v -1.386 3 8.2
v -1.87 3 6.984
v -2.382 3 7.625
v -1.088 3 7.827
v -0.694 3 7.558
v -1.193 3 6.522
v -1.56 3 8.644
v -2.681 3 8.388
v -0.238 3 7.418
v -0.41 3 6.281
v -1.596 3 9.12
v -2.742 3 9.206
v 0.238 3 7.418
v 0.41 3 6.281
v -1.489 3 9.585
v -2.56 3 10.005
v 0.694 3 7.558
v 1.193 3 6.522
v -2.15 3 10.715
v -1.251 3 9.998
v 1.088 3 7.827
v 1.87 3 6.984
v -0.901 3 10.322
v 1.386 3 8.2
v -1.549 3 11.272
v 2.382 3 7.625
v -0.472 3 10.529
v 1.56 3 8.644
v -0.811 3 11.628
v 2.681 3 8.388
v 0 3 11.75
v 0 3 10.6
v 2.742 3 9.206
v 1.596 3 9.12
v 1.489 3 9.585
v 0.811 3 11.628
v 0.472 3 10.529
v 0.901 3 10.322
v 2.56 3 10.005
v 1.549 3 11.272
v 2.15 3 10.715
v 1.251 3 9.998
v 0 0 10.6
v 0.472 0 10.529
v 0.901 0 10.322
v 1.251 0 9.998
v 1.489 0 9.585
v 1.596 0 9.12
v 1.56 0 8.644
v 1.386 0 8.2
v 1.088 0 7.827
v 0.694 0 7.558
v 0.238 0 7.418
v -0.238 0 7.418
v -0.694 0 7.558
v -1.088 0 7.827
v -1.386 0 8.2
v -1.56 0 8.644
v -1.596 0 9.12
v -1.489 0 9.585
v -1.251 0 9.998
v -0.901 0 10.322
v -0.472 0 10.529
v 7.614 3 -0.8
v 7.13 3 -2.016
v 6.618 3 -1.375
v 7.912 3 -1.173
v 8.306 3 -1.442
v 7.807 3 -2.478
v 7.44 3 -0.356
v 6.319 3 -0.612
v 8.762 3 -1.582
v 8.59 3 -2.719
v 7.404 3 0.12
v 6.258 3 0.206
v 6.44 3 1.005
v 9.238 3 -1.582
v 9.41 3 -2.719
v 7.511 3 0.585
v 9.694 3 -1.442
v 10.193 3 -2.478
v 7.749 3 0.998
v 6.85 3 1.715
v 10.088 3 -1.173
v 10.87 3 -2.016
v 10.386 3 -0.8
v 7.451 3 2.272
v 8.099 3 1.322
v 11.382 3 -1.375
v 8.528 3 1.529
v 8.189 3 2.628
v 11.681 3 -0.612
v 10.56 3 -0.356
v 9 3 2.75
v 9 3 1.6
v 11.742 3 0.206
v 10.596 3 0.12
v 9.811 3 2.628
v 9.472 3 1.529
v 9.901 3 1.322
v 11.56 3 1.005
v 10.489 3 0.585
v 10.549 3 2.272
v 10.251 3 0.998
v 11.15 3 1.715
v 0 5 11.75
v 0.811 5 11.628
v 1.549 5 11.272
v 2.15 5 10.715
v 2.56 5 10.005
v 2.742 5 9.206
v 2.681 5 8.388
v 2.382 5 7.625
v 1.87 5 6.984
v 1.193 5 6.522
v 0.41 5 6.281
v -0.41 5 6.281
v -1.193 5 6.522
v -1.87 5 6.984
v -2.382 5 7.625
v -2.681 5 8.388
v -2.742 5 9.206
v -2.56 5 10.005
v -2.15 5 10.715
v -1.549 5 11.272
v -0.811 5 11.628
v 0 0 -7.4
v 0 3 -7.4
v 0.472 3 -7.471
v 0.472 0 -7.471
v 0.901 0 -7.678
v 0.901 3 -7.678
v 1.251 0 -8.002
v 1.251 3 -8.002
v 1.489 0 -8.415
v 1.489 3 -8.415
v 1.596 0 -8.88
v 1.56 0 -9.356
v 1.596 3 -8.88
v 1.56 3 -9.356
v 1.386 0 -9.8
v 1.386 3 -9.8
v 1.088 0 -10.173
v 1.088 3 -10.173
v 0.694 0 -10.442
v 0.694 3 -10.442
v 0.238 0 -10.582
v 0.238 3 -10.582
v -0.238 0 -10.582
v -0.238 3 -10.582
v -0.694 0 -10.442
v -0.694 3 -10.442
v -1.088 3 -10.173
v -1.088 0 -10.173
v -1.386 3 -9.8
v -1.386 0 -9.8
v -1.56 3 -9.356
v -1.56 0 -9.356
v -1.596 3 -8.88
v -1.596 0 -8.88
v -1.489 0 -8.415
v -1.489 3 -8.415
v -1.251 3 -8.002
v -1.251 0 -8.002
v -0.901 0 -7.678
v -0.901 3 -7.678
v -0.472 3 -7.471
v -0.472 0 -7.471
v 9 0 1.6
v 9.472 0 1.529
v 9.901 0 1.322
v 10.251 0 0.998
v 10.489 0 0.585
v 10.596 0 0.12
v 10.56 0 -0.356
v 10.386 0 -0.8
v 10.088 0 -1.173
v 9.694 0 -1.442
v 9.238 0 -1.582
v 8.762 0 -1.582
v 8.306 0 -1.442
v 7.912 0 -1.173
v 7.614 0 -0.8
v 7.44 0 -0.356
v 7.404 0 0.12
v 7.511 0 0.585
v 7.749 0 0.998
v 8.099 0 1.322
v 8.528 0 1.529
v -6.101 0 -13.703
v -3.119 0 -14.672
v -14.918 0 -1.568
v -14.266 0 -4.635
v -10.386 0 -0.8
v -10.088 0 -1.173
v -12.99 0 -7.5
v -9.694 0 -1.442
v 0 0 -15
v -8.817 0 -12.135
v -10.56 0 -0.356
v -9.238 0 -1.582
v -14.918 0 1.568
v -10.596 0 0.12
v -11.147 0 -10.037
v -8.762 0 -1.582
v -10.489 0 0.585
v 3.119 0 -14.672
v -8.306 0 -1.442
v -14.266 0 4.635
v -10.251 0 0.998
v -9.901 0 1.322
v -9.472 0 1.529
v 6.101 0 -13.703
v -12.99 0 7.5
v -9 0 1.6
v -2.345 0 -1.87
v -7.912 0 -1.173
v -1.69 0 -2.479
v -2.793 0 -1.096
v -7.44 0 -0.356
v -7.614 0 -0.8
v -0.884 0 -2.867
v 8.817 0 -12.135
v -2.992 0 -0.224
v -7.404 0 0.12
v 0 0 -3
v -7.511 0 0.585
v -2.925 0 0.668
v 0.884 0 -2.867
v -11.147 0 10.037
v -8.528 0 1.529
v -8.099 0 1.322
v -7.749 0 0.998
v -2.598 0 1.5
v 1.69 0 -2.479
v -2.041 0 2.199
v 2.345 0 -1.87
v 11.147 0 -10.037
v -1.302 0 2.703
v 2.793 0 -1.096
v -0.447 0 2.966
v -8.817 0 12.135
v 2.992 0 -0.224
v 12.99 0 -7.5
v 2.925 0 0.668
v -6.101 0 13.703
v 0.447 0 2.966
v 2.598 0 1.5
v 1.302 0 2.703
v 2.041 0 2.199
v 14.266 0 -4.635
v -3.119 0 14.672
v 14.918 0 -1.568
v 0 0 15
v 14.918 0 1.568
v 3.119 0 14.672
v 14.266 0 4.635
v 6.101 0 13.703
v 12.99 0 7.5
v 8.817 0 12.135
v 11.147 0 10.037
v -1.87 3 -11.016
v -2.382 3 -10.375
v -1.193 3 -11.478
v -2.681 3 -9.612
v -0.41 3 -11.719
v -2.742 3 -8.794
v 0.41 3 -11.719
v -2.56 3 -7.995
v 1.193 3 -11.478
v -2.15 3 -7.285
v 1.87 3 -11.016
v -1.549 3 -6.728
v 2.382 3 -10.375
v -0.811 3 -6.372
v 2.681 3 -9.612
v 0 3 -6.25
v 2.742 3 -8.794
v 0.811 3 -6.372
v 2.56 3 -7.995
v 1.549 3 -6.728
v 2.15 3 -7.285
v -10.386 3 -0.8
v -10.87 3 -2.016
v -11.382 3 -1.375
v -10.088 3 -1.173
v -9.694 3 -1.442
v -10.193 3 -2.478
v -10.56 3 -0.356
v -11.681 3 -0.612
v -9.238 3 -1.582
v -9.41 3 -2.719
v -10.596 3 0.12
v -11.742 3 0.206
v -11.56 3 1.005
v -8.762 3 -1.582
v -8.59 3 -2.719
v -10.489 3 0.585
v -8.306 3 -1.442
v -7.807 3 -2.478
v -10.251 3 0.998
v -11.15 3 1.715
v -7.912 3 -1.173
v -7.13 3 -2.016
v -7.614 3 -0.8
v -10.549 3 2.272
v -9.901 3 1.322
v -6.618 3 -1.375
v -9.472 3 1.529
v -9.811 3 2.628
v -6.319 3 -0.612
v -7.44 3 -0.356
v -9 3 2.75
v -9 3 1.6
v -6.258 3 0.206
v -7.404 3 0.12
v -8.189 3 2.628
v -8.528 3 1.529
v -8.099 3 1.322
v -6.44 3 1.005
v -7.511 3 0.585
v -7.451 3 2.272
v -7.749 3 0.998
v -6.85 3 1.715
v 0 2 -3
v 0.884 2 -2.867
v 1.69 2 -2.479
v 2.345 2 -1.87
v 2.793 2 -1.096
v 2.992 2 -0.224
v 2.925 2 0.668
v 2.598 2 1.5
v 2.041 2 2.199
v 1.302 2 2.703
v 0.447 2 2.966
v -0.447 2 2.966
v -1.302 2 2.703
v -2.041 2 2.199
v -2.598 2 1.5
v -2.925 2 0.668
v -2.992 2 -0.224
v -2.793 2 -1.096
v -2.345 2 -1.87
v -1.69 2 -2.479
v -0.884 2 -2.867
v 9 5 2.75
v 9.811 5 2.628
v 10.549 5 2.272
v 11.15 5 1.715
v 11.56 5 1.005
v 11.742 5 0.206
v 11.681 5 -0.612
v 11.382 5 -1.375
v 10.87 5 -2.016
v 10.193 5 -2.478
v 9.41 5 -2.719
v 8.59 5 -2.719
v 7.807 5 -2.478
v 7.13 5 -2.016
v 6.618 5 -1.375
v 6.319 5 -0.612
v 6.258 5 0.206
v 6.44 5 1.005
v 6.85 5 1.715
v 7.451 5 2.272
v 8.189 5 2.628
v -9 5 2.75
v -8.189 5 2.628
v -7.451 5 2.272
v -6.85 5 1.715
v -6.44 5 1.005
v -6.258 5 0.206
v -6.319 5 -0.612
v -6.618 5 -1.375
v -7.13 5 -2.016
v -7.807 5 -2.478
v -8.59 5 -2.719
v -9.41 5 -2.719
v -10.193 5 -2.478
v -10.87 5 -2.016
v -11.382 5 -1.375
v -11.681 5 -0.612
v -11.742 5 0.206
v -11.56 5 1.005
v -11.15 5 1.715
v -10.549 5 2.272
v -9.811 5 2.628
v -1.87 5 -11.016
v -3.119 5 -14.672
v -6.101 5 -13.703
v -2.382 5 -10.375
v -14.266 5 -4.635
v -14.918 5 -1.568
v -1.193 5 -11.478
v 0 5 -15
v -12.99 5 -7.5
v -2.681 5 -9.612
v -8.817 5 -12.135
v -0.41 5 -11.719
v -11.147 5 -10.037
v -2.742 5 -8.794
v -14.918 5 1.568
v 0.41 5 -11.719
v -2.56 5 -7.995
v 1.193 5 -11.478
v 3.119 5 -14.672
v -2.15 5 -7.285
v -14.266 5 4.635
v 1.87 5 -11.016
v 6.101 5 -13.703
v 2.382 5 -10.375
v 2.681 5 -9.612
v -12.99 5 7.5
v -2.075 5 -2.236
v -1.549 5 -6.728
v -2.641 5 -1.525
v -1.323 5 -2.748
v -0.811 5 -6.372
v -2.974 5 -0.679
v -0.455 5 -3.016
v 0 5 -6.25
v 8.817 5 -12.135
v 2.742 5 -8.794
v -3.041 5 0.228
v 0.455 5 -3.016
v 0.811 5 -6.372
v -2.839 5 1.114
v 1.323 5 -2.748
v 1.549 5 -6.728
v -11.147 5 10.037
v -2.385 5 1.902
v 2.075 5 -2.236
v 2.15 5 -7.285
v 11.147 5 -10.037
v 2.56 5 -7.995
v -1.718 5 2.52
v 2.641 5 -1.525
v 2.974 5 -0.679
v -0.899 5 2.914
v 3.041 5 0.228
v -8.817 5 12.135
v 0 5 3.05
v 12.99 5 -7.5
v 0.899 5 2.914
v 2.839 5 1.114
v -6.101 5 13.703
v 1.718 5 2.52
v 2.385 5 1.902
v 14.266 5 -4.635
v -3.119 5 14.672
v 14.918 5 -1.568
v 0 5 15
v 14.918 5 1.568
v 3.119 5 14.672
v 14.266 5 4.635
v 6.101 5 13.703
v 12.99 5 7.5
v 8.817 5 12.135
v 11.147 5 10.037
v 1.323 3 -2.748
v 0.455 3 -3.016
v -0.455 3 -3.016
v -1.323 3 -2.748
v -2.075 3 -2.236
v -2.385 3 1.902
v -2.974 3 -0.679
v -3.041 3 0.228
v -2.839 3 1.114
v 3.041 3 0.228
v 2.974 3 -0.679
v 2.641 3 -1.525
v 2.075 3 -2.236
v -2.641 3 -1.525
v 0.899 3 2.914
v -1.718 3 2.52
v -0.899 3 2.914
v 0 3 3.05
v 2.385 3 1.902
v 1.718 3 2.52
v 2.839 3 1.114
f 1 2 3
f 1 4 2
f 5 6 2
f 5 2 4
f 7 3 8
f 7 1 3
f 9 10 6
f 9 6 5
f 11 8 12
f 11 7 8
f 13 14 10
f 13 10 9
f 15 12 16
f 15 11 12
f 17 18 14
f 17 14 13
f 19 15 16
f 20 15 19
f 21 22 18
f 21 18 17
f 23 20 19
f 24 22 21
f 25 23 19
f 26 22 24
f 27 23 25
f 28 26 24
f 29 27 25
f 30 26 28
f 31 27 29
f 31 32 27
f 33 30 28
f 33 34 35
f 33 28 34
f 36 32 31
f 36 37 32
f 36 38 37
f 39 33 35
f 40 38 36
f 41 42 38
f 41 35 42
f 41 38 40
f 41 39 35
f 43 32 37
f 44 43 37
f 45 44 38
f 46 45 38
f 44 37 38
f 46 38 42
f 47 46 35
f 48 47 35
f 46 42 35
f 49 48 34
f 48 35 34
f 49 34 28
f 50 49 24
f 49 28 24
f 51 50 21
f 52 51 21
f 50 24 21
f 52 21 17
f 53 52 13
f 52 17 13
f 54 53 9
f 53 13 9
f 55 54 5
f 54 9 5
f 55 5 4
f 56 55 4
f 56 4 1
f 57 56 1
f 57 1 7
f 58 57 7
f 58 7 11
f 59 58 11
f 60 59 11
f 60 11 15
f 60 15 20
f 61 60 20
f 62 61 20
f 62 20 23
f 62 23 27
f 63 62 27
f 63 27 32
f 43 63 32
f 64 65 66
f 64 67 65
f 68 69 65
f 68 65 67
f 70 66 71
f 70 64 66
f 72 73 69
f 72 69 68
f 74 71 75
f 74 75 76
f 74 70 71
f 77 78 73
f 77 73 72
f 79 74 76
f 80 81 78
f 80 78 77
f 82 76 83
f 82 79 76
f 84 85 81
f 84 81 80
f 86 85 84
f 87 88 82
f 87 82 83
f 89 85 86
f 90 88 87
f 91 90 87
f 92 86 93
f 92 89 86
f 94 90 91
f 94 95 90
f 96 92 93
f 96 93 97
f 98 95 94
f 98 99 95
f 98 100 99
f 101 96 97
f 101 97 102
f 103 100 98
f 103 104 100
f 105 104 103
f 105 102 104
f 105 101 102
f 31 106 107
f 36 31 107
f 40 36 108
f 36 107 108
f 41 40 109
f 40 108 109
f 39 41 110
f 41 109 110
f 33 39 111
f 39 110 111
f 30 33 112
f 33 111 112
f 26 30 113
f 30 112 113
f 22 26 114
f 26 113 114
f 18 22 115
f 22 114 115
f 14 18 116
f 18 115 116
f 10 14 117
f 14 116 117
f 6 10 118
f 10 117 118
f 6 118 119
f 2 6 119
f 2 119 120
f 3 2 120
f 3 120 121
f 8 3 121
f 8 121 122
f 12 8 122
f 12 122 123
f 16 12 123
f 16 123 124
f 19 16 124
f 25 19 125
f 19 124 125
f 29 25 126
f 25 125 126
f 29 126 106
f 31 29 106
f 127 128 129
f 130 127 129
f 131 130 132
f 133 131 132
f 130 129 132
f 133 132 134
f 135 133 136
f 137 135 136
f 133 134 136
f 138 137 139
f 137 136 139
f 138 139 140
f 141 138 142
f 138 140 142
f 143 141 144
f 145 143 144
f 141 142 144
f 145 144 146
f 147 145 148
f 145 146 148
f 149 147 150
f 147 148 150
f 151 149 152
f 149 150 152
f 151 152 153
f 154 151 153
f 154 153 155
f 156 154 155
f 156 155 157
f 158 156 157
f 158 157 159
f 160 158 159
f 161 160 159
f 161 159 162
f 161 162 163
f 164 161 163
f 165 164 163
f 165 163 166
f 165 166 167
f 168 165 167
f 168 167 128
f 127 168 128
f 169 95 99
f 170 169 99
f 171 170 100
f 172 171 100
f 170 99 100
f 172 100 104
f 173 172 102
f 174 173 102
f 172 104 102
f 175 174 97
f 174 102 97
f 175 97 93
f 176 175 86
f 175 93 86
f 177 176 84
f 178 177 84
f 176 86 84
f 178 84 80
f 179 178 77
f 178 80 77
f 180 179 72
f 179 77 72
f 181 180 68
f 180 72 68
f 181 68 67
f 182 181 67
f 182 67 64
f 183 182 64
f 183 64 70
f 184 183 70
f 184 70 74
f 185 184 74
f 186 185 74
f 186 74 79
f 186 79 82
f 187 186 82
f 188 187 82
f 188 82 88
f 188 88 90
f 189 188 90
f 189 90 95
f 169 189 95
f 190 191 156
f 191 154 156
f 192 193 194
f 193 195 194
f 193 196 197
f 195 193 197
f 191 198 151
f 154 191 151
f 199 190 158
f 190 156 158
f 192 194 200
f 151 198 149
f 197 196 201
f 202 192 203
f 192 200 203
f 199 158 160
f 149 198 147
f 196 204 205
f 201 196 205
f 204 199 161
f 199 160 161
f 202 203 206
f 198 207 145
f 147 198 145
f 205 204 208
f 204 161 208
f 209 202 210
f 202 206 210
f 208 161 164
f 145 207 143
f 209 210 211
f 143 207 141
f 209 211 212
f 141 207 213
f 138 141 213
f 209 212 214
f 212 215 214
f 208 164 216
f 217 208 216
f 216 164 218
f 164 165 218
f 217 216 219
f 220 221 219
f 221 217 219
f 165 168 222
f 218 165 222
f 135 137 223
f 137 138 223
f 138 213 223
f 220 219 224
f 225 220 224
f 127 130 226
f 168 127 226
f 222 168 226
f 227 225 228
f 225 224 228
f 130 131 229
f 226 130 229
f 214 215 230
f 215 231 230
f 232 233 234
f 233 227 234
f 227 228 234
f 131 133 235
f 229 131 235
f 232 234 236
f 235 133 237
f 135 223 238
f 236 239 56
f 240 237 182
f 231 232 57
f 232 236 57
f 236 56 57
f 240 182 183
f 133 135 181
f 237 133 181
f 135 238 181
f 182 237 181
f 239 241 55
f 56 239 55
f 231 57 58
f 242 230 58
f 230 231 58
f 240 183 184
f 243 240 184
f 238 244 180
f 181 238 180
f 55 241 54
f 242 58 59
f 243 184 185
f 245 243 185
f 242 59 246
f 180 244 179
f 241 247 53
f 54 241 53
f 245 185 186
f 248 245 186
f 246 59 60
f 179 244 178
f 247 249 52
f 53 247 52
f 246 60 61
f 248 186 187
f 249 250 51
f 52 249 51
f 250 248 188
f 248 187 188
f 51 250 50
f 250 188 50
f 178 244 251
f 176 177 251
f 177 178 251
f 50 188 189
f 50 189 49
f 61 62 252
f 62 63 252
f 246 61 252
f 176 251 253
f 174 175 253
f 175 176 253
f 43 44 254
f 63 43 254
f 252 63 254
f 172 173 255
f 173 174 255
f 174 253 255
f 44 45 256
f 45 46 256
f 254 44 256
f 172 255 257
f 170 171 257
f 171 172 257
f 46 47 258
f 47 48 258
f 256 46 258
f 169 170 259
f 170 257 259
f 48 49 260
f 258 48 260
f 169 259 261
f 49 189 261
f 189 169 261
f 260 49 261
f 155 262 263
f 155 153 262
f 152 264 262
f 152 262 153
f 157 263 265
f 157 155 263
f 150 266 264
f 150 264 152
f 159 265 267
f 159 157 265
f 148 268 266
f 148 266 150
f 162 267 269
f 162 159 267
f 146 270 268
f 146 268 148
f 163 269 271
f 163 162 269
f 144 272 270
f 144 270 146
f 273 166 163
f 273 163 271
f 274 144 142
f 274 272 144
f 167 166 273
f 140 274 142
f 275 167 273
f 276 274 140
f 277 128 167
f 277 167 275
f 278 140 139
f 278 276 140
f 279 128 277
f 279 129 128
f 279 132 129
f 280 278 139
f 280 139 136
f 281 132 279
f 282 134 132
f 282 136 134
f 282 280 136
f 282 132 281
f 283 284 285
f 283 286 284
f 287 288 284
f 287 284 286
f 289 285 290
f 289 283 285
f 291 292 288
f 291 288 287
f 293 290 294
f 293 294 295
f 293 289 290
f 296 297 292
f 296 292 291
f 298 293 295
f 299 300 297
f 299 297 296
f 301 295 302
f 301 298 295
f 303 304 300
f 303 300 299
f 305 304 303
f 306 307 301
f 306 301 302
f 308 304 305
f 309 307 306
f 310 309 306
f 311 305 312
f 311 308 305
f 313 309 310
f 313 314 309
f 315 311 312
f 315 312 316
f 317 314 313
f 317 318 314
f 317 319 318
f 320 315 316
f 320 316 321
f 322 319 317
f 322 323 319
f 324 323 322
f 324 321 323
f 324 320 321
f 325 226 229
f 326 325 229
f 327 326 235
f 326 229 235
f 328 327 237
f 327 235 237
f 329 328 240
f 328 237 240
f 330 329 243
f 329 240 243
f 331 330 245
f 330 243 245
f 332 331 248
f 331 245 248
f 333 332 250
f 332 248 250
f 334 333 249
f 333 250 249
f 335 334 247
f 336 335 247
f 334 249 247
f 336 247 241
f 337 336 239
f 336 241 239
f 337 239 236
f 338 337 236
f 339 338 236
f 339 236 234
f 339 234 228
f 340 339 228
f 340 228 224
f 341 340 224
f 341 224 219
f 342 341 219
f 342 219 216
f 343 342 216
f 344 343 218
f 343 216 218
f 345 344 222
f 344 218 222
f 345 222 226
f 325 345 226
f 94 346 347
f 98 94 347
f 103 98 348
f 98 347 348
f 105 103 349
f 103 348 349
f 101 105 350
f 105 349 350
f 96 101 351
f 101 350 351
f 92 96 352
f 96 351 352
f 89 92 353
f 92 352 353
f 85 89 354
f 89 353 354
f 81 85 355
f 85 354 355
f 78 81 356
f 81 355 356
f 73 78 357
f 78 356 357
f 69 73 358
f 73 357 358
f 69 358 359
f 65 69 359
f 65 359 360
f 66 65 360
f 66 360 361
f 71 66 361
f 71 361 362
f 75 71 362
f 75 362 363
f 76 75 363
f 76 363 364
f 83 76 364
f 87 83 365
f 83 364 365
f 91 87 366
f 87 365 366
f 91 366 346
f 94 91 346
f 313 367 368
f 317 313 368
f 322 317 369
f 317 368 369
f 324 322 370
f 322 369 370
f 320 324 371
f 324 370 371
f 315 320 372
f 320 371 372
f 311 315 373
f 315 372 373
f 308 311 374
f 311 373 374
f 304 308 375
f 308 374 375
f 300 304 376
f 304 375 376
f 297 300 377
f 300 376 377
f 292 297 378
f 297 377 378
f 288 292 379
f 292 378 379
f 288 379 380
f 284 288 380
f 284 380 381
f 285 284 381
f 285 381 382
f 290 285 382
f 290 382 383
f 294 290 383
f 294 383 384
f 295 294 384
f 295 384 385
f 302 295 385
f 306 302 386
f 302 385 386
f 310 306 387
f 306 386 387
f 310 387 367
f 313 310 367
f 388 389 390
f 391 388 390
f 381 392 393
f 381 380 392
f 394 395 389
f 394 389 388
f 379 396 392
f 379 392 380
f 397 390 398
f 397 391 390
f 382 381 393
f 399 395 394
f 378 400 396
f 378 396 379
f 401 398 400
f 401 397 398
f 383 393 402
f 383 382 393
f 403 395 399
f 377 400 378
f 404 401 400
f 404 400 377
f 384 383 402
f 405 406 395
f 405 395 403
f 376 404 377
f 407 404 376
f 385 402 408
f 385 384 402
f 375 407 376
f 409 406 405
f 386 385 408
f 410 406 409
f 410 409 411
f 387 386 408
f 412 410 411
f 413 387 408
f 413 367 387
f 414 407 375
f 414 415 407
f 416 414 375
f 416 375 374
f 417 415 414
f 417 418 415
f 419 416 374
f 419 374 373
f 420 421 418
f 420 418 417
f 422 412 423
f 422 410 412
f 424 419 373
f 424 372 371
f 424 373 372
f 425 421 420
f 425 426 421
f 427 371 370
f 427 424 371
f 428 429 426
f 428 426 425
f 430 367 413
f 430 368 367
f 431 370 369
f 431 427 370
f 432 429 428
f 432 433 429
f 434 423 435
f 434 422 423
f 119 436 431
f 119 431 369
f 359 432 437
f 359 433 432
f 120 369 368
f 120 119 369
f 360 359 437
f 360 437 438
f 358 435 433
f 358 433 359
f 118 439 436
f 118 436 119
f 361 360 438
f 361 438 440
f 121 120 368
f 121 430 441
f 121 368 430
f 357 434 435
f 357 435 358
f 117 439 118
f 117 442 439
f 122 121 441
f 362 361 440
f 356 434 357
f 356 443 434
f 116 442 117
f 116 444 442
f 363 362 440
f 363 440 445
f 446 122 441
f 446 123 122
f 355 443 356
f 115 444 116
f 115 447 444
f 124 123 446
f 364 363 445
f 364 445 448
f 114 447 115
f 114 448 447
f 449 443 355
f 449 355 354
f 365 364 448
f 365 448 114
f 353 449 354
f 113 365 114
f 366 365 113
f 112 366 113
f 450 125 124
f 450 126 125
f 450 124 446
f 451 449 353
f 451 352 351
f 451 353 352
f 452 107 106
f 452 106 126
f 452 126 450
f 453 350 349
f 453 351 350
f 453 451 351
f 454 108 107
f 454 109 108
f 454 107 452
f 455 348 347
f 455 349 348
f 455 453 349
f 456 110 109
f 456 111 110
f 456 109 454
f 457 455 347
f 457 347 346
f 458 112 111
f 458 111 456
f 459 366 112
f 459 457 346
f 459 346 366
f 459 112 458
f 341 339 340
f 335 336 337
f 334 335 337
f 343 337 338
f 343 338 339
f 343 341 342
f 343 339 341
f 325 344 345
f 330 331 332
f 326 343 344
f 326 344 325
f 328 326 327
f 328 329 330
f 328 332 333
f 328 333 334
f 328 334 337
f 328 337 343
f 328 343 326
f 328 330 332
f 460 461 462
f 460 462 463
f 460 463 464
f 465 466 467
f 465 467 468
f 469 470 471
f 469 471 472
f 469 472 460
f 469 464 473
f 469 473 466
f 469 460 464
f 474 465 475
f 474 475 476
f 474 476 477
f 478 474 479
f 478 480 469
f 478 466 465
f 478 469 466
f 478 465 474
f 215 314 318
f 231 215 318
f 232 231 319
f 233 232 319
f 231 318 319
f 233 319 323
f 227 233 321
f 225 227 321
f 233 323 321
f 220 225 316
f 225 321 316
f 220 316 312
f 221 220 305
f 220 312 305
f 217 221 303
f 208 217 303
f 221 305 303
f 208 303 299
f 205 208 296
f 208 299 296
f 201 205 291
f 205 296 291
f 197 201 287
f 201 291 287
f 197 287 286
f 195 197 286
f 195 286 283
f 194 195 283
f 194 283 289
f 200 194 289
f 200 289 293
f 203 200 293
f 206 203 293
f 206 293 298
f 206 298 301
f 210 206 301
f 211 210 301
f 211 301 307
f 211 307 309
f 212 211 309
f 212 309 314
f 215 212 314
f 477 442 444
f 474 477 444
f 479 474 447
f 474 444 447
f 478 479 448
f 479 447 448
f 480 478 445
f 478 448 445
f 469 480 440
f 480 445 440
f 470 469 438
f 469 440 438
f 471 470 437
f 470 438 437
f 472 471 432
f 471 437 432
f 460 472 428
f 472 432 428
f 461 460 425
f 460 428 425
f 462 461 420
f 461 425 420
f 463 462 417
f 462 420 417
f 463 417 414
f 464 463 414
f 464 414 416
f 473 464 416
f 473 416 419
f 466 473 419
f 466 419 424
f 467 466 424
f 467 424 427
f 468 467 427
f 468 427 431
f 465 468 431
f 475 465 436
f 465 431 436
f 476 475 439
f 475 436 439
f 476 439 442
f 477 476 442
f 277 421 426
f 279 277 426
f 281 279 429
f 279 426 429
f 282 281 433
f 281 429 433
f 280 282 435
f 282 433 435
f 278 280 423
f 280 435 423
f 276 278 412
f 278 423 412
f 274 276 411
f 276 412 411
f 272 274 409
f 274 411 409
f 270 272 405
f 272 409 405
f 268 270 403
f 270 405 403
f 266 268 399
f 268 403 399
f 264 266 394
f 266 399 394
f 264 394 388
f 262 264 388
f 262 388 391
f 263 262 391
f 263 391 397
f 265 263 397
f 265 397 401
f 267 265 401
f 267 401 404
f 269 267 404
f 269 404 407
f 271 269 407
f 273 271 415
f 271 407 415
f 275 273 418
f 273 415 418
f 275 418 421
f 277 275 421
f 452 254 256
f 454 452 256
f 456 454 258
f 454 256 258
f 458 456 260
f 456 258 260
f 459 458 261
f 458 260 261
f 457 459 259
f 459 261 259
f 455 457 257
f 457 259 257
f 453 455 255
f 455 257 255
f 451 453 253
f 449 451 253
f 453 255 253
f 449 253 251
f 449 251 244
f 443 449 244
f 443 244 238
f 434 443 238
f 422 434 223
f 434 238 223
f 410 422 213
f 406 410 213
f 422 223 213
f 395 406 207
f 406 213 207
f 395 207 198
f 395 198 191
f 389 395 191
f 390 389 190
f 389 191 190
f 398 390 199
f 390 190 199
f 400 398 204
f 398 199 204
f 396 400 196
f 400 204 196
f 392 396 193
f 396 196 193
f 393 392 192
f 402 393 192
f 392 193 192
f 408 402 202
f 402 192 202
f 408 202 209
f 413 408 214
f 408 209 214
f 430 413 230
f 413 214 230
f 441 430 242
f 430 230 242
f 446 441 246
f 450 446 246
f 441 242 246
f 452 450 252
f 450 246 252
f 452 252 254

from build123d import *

# Parameters (mm, degrees)
SKETCH1_R           = 15
BOSS_EXTRUDE1_DEPTH = 5
SKETCH2_R           = 3
CUT_EXTRUDE1_DEPTH  = 2
SKETCH3_R           = 1.6
CUT_EXTRUDE2_DEPTH  = 5
SKETCH4_R           = 2.75
SKETCH4_R_2         = 3.05
CUT_EXTRUDE3_DEPTH  = 2


with BuildPart() as part:
    # Sketch1 → Boss-Extrude1 (new body)
    with BuildSketch(Plane(origin=(0, 0, 0), x_dir=(1, 0, 0), z_dir=(0, 1, 0))):
        with Locations(Location((0, 0, 0), (0, 0, 270))):
            Circle(SKETCH1_R)
    extrude(amount=BOSS_EXTRUDE1_DEPTH)

    # Sketch2 → Cut-Extrude1 (cut)
    with BuildSketch(Plane.XZ):
        with Locations(Location((0, 0, 0), (0, 0, 270))):
            Circle(SKETCH2_R)
    extrude(amount=-CUT_EXTRUDE1_DEPTH, mode=Mode.SUBTRACT)

    # Sketch3 → Cut-Extrude2 (cut)
    with BuildSketch(Plane(origin=(0, 5, 0), x_dir=(1, 0, 0), z_dir=(0, 1, 0))):
        with Locations(Location((0, 9, 0), (0, 0, 270))):
            Circle(SKETCH3_R)
        with Locations(Location((0, -9, 0), (0, 0, 270))):
            Circle(SKETCH3_R)
        with Locations(Location((9, 0, 0), (0, 0, 270))):
            Circle(SKETCH3_R)
        with Locations(Location((-9, 0, 0), (0, 0, 270))):
            Circle(SKETCH3_R)
    extrude(amount=-CUT_EXTRUDE2_DEPTH, mode=Mode.SUBTRACT)

    # Sketch4 → Cut-Extrude3 (cut)
    with BuildSketch(Plane(origin=(0, 5, 0), x_dir=(1, 0, 0), z_dir=(0, 1, 0))):
        with Locations(Location((0, 9, 0), (0, 0, 270))):
            Circle(SKETCH4_R)
        with Locations(Location((-9, 0, 0), (0, 0, 270))):
            Circle(SKETCH4_R)
        with Locations(Location((9, 0, 0), (0, 0, 270))):
            Circle(SKETCH4_R)
        with Locations(Location((0, -9, 0), (0, 0, 270))):
            Circle(SKETCH4_R)
        with Locations(Location((0, 0, 0), (0, 0, 270))):
            Circle(SKETCH4_R_2)
    extrude(amount=-CUT_EXTRUDE3_DEPTH, mode=Mode.SUBTRACT)


solid = part.part
